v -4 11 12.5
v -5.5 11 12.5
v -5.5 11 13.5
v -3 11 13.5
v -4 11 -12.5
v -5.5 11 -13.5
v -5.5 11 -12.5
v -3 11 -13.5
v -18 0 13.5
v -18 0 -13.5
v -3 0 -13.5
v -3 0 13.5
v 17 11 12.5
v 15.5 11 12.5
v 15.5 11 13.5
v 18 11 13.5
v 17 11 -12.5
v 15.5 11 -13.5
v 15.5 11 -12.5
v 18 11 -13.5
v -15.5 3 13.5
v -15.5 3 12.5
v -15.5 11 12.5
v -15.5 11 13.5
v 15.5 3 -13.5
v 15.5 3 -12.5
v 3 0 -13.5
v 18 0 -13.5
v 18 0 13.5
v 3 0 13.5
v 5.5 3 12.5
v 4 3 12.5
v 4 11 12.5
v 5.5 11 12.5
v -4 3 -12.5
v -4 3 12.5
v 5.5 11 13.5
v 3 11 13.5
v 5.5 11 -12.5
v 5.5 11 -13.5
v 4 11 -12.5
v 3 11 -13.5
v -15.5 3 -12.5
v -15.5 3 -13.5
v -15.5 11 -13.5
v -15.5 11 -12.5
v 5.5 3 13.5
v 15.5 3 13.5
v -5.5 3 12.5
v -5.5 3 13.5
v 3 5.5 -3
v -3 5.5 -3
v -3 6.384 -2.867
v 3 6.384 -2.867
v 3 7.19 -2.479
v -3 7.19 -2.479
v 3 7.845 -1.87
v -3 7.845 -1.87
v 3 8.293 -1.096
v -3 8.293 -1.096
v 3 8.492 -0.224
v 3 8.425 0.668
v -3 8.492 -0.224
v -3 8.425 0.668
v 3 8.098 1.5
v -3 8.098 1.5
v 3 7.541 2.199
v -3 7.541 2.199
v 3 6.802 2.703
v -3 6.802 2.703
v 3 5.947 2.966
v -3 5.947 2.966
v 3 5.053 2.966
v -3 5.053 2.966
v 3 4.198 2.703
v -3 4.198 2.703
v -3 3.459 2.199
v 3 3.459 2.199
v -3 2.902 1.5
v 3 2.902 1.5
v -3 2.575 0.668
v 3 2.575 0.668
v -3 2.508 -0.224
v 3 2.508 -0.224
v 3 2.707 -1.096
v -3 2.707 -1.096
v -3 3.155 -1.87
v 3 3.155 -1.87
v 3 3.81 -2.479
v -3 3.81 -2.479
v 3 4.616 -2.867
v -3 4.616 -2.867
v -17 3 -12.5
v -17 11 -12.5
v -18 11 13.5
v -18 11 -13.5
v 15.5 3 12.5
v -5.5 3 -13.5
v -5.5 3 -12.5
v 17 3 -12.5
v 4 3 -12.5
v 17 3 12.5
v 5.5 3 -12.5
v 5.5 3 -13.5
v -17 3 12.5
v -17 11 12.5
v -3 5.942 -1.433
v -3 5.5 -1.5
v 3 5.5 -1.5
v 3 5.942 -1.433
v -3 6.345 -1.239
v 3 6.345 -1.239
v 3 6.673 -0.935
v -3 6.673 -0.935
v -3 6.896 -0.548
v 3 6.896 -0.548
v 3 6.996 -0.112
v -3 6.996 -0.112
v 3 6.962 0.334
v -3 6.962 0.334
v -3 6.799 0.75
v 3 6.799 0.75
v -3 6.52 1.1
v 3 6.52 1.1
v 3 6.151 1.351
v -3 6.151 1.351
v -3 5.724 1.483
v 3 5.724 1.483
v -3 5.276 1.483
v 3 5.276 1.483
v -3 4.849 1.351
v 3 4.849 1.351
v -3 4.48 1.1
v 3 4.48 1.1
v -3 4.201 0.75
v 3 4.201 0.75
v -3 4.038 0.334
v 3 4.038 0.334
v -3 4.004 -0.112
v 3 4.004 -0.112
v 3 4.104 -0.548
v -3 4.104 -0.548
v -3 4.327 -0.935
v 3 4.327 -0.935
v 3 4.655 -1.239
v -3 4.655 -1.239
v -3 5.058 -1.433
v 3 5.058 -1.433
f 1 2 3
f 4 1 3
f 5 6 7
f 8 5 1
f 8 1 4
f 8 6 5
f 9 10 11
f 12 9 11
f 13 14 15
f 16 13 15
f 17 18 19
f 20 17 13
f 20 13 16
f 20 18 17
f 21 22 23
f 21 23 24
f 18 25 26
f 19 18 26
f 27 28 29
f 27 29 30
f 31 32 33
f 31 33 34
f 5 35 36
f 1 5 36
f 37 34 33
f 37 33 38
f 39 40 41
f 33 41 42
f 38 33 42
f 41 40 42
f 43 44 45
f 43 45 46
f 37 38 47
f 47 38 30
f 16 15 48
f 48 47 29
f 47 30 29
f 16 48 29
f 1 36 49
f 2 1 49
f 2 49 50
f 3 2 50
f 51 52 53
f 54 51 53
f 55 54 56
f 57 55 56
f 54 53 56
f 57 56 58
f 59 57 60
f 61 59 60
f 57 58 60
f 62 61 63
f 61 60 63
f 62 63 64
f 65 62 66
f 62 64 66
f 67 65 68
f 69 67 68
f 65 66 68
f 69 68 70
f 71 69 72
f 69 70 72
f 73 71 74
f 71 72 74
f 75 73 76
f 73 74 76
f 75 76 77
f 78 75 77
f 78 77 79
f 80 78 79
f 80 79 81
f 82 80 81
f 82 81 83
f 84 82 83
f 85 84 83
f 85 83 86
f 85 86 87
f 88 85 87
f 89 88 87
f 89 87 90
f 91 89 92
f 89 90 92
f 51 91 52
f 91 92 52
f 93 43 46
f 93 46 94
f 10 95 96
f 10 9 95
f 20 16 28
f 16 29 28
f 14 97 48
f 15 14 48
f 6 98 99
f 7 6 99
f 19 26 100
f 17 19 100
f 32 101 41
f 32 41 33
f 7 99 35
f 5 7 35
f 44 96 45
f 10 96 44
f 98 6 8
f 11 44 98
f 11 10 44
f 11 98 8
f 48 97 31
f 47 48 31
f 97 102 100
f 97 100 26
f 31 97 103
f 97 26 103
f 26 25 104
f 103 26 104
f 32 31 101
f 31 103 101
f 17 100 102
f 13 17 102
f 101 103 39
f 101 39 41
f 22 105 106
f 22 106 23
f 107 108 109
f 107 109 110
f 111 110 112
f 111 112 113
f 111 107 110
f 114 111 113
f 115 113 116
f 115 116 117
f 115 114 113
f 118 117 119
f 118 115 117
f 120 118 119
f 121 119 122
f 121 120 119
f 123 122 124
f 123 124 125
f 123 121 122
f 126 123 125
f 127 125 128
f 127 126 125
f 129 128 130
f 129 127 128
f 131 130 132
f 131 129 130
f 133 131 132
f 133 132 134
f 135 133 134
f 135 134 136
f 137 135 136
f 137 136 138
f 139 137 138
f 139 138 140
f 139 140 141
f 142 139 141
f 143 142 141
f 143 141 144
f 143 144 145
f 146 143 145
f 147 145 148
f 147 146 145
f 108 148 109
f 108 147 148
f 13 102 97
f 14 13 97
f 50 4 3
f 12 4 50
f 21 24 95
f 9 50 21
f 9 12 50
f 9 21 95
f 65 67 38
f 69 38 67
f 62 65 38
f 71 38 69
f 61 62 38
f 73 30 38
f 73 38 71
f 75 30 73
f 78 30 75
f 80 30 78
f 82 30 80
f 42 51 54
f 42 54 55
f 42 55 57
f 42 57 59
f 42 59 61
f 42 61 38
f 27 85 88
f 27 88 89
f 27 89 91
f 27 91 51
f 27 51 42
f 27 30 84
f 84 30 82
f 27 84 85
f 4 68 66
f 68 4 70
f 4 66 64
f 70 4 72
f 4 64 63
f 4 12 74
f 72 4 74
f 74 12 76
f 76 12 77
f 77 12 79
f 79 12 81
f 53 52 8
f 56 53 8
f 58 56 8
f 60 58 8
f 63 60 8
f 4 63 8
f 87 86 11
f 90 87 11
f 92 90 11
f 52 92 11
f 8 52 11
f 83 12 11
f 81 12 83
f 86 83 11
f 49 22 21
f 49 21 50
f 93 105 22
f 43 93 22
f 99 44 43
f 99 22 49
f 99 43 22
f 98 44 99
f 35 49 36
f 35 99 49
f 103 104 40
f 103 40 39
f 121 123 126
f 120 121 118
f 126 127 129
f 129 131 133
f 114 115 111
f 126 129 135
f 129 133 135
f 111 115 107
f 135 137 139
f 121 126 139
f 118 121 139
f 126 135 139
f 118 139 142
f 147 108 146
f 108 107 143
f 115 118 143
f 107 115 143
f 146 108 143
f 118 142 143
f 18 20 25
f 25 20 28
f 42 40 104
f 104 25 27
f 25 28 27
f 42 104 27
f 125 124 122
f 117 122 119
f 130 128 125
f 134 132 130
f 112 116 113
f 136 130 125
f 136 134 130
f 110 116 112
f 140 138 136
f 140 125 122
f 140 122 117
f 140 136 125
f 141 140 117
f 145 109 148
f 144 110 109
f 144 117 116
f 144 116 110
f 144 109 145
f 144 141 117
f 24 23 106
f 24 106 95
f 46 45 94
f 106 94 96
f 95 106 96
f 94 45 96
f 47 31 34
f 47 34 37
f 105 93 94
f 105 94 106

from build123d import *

# Parameters (mm, degrees)
BASE_REFERENCE_SKETCH_W = 15
BASE_REFERENCE_SKETCH_H = 27
BASE_EXTRUDE_DEPTH      = 3
BOSS_EXTRUDE2_START     = 3
BOSS_EXTRUDE2_DEPTH     = 8
BOSS_EXTRUDE4_START     = -3
SKETCH1_R               = 3
SKETCH1_R_2             = 1.5
BOSS_EXTRUDE4_DEPTH     = 6


with BuildPart() as part:
    # Base Reference Sketch → Base Extrude (new body)
    with BuildSketch(Plane(origin=(0, 0, 0), x_dir=(1, 0, 0), z_dir=(0, 1, 0))):
        with Locations((-10.5, 0)):
            Rectangle(BASE_REFERENCE_SKETCH_W, BASE_REFERENCE_SKETCH_H)
    extrude(amount=BASE_EXTRUDE_DEPTH)

    # Base Reference Sketch<5> → Boss-Extrude2 (add)
    with BuildSketch(Plane(origin=(0, 0, 0), x_dir=(1, 0, 0), z_dir=(0, 1, 0)).offset(BOSS_EXTRUDE2_START)):
        Polygon((-18, 13.5), (-15.5, 13.5), (-15.5, 12.5), (-17, 12.5), (-17, -12.5), (-15.5, -12.5), (-15.5, -13.5), (-18, -13.5), align=None)
        Polygon((-4, 12.5), (-4, -12.5), (-5.5, -12.5), (-5.5, -13.5), (-3, -13.5), (-3, 13.5), (-5.5, 13.5), (-5.5, 12.5), align=None)
    extrude(amount=BOSS_EXTRUDE2_DEPTH)


with BuildPart() as body_2:
    # Mirror2: mirrored copy
    add(part.part.mirror(Plane(origin=(0, 0, 0), x_dir=(0, 0, 1), z_dir=(1, 0, 0))))


with BuildPart() as part_1:
    add(part.part)

    add(body_2.part)  # Boss-Extrude4 merges body 2
    # Sketch1 → Boss-Extrude4 (add)
    with BuildSketch(Plane(origin=(0, 0, 0), x_dir=(0, 0, -1), z_dir=(1, 0, 0)).offset(BOSS_EXTRUDE4_START)):
        with Locations((0, 5.5)):
            Circle(SKETCH1_R)
        with Locations((0, 5.5)):
            Circle(SKETCH1_R_2, mode=Mode.SUBTRACT)
    extrude(amount=BOSS_EXTRUDE4_DEPTH)


solid = part_1.part
